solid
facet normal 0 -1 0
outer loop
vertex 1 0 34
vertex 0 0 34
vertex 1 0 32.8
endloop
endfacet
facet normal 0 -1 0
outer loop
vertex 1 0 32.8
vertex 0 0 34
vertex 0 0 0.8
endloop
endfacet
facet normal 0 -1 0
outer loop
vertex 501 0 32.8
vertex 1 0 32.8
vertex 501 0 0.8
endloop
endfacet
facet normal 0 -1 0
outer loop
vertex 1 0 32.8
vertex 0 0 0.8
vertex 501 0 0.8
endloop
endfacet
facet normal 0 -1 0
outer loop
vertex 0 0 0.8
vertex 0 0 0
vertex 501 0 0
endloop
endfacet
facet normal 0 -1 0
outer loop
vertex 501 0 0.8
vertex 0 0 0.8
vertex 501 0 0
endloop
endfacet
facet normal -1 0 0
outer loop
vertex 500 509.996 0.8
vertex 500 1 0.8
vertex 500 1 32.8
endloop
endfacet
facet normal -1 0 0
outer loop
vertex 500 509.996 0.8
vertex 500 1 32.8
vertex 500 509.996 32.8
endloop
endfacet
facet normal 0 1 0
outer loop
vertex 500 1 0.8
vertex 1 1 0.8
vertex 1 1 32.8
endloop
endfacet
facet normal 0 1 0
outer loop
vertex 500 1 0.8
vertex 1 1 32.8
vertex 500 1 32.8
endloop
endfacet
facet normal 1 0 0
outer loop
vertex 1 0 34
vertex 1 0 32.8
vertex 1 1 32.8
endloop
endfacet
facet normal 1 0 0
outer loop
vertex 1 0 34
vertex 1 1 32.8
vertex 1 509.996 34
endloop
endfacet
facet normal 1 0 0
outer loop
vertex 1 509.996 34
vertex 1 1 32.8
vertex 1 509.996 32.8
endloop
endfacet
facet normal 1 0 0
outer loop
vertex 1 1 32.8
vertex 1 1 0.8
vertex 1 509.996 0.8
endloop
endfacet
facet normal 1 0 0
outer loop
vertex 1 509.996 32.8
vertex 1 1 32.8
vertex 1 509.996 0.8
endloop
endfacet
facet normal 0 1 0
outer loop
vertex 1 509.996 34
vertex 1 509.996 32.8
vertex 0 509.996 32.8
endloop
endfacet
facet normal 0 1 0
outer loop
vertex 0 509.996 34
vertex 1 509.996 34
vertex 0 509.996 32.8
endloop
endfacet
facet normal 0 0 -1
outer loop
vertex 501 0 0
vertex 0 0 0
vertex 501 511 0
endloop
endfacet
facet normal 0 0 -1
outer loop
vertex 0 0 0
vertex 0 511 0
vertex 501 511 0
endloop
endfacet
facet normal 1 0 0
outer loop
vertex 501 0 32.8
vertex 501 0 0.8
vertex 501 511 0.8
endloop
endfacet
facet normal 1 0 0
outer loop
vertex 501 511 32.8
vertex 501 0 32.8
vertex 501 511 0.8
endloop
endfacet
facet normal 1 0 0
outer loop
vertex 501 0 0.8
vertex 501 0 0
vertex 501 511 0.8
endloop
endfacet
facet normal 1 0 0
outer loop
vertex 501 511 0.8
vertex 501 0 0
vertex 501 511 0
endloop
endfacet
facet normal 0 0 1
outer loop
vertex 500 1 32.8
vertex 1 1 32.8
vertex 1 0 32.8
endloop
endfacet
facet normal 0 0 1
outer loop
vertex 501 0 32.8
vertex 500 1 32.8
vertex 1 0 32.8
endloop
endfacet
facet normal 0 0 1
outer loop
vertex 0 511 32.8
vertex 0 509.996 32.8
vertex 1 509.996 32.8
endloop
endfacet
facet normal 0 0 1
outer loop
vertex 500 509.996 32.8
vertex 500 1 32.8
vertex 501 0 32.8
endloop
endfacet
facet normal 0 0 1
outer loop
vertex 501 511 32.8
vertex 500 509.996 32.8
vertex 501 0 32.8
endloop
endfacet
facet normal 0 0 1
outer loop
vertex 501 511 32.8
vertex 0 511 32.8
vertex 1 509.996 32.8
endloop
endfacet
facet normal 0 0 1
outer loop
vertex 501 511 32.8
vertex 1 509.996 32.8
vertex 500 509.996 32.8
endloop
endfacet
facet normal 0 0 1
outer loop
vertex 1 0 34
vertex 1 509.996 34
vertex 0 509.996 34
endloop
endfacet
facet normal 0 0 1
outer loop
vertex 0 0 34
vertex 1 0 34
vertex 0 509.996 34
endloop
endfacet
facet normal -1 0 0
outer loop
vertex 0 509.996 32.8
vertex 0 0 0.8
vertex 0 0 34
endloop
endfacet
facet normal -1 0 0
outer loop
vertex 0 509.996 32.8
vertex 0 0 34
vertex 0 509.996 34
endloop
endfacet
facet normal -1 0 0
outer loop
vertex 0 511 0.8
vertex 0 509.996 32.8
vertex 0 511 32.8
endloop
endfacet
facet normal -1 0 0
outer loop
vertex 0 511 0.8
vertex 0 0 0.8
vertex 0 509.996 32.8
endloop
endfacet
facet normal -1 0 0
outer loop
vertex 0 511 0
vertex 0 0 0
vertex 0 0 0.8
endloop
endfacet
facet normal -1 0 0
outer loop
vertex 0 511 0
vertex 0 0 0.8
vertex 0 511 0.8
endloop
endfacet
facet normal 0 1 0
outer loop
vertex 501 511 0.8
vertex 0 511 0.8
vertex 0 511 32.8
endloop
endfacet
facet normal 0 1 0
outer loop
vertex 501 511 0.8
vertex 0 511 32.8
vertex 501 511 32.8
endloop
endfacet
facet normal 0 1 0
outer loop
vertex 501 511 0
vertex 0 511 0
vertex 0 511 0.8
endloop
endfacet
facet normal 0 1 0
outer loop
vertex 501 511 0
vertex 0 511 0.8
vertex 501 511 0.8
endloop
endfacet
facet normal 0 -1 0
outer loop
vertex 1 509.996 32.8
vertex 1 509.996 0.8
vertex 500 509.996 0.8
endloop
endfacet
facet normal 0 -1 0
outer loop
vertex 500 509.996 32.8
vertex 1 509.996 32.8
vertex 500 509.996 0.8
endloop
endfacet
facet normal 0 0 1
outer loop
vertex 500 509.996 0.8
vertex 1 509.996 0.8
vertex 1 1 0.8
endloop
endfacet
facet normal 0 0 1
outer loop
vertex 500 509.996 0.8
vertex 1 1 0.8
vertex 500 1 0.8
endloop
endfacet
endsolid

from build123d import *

# Parameters (mm, degrees)
SKETCH1_W           = 501
SKETCH1_H           = 511
BOSS_EXTRUDE1_DEPTH = 0.8
SKETCH2_W           = 501
SKETCH2_H           = 1.003667413
BOSS_EXTRUDE2_DEPTH = 32
SKETCH3_W           = 1
SKETCH3_H           = 509.996332587
BOSS_EXTRUDE3_DEPTH = 32
SKETCH7_W           = 1
SKETCH7_H           = 509.996332587
BOSS_EXTRUDE4_DEPTH = 34
SKETCH8_W           = 499
SKETCH8_H           = 1
BOSS_EXTRUDE5_DEPTH = 32


with BuildPart() as part:
    # Sketch1 → Boss-Extrude1 (new body)
    with BuildSketch(Plane.XY):
        with Locations((250.5, 255.5)):
            Rectangle(SKETCH1_W, SKETCH1_H)
    extrude(amount=BOSS_EXTRUDE1_DEPTH)

    # Sketch2 → Boss-Extrude2 (add)
    with BuildSketch(Plane.XY.offset(0.8)):
        with Locations((250.5, 510.498166294)):
            Rectangle(SKETCH2_W, SKETCH2_H)
    extrude(amount=BOSS_EXTRUDE2_DEPTH)

    # Sketch3 → Boss-Extrude3 (add)
    with BuildSketch(Plane.XY.offset(0.8)):
        with Locations((500.5, 254.998166294)):
            Rectangle(SKETCH3_W, SKETCH3_H)
    extrude(amount=BOSS_EXTRUDE3_DEPTH)

    # Sketch7 → Boss-Extrude4 (add)
    with BuildSketch(Plane(origin=(0, 0, 0), x_dir=(-1, 0, 0), z_dir=(0, 0, -1))):
        with Locations((-0.5, 254.998166294)):
            Rectangle(SKETCH7_W, SKETCH7_H)
    extrude(amount=-BOSS_EXTRUDE4_DEPTH)

    # Sketch8 → Boss-Extrude5 (add)
    with BuildSketch(Plane.XY.offset(0.8)):
        with Locations((250.5, 0.5)):
            Rectangle(SKETCH8_W, SKETCH8_H)
    extrude(amount=BOSS_EXTRUDE5_DEPTH)


solid = part.part
